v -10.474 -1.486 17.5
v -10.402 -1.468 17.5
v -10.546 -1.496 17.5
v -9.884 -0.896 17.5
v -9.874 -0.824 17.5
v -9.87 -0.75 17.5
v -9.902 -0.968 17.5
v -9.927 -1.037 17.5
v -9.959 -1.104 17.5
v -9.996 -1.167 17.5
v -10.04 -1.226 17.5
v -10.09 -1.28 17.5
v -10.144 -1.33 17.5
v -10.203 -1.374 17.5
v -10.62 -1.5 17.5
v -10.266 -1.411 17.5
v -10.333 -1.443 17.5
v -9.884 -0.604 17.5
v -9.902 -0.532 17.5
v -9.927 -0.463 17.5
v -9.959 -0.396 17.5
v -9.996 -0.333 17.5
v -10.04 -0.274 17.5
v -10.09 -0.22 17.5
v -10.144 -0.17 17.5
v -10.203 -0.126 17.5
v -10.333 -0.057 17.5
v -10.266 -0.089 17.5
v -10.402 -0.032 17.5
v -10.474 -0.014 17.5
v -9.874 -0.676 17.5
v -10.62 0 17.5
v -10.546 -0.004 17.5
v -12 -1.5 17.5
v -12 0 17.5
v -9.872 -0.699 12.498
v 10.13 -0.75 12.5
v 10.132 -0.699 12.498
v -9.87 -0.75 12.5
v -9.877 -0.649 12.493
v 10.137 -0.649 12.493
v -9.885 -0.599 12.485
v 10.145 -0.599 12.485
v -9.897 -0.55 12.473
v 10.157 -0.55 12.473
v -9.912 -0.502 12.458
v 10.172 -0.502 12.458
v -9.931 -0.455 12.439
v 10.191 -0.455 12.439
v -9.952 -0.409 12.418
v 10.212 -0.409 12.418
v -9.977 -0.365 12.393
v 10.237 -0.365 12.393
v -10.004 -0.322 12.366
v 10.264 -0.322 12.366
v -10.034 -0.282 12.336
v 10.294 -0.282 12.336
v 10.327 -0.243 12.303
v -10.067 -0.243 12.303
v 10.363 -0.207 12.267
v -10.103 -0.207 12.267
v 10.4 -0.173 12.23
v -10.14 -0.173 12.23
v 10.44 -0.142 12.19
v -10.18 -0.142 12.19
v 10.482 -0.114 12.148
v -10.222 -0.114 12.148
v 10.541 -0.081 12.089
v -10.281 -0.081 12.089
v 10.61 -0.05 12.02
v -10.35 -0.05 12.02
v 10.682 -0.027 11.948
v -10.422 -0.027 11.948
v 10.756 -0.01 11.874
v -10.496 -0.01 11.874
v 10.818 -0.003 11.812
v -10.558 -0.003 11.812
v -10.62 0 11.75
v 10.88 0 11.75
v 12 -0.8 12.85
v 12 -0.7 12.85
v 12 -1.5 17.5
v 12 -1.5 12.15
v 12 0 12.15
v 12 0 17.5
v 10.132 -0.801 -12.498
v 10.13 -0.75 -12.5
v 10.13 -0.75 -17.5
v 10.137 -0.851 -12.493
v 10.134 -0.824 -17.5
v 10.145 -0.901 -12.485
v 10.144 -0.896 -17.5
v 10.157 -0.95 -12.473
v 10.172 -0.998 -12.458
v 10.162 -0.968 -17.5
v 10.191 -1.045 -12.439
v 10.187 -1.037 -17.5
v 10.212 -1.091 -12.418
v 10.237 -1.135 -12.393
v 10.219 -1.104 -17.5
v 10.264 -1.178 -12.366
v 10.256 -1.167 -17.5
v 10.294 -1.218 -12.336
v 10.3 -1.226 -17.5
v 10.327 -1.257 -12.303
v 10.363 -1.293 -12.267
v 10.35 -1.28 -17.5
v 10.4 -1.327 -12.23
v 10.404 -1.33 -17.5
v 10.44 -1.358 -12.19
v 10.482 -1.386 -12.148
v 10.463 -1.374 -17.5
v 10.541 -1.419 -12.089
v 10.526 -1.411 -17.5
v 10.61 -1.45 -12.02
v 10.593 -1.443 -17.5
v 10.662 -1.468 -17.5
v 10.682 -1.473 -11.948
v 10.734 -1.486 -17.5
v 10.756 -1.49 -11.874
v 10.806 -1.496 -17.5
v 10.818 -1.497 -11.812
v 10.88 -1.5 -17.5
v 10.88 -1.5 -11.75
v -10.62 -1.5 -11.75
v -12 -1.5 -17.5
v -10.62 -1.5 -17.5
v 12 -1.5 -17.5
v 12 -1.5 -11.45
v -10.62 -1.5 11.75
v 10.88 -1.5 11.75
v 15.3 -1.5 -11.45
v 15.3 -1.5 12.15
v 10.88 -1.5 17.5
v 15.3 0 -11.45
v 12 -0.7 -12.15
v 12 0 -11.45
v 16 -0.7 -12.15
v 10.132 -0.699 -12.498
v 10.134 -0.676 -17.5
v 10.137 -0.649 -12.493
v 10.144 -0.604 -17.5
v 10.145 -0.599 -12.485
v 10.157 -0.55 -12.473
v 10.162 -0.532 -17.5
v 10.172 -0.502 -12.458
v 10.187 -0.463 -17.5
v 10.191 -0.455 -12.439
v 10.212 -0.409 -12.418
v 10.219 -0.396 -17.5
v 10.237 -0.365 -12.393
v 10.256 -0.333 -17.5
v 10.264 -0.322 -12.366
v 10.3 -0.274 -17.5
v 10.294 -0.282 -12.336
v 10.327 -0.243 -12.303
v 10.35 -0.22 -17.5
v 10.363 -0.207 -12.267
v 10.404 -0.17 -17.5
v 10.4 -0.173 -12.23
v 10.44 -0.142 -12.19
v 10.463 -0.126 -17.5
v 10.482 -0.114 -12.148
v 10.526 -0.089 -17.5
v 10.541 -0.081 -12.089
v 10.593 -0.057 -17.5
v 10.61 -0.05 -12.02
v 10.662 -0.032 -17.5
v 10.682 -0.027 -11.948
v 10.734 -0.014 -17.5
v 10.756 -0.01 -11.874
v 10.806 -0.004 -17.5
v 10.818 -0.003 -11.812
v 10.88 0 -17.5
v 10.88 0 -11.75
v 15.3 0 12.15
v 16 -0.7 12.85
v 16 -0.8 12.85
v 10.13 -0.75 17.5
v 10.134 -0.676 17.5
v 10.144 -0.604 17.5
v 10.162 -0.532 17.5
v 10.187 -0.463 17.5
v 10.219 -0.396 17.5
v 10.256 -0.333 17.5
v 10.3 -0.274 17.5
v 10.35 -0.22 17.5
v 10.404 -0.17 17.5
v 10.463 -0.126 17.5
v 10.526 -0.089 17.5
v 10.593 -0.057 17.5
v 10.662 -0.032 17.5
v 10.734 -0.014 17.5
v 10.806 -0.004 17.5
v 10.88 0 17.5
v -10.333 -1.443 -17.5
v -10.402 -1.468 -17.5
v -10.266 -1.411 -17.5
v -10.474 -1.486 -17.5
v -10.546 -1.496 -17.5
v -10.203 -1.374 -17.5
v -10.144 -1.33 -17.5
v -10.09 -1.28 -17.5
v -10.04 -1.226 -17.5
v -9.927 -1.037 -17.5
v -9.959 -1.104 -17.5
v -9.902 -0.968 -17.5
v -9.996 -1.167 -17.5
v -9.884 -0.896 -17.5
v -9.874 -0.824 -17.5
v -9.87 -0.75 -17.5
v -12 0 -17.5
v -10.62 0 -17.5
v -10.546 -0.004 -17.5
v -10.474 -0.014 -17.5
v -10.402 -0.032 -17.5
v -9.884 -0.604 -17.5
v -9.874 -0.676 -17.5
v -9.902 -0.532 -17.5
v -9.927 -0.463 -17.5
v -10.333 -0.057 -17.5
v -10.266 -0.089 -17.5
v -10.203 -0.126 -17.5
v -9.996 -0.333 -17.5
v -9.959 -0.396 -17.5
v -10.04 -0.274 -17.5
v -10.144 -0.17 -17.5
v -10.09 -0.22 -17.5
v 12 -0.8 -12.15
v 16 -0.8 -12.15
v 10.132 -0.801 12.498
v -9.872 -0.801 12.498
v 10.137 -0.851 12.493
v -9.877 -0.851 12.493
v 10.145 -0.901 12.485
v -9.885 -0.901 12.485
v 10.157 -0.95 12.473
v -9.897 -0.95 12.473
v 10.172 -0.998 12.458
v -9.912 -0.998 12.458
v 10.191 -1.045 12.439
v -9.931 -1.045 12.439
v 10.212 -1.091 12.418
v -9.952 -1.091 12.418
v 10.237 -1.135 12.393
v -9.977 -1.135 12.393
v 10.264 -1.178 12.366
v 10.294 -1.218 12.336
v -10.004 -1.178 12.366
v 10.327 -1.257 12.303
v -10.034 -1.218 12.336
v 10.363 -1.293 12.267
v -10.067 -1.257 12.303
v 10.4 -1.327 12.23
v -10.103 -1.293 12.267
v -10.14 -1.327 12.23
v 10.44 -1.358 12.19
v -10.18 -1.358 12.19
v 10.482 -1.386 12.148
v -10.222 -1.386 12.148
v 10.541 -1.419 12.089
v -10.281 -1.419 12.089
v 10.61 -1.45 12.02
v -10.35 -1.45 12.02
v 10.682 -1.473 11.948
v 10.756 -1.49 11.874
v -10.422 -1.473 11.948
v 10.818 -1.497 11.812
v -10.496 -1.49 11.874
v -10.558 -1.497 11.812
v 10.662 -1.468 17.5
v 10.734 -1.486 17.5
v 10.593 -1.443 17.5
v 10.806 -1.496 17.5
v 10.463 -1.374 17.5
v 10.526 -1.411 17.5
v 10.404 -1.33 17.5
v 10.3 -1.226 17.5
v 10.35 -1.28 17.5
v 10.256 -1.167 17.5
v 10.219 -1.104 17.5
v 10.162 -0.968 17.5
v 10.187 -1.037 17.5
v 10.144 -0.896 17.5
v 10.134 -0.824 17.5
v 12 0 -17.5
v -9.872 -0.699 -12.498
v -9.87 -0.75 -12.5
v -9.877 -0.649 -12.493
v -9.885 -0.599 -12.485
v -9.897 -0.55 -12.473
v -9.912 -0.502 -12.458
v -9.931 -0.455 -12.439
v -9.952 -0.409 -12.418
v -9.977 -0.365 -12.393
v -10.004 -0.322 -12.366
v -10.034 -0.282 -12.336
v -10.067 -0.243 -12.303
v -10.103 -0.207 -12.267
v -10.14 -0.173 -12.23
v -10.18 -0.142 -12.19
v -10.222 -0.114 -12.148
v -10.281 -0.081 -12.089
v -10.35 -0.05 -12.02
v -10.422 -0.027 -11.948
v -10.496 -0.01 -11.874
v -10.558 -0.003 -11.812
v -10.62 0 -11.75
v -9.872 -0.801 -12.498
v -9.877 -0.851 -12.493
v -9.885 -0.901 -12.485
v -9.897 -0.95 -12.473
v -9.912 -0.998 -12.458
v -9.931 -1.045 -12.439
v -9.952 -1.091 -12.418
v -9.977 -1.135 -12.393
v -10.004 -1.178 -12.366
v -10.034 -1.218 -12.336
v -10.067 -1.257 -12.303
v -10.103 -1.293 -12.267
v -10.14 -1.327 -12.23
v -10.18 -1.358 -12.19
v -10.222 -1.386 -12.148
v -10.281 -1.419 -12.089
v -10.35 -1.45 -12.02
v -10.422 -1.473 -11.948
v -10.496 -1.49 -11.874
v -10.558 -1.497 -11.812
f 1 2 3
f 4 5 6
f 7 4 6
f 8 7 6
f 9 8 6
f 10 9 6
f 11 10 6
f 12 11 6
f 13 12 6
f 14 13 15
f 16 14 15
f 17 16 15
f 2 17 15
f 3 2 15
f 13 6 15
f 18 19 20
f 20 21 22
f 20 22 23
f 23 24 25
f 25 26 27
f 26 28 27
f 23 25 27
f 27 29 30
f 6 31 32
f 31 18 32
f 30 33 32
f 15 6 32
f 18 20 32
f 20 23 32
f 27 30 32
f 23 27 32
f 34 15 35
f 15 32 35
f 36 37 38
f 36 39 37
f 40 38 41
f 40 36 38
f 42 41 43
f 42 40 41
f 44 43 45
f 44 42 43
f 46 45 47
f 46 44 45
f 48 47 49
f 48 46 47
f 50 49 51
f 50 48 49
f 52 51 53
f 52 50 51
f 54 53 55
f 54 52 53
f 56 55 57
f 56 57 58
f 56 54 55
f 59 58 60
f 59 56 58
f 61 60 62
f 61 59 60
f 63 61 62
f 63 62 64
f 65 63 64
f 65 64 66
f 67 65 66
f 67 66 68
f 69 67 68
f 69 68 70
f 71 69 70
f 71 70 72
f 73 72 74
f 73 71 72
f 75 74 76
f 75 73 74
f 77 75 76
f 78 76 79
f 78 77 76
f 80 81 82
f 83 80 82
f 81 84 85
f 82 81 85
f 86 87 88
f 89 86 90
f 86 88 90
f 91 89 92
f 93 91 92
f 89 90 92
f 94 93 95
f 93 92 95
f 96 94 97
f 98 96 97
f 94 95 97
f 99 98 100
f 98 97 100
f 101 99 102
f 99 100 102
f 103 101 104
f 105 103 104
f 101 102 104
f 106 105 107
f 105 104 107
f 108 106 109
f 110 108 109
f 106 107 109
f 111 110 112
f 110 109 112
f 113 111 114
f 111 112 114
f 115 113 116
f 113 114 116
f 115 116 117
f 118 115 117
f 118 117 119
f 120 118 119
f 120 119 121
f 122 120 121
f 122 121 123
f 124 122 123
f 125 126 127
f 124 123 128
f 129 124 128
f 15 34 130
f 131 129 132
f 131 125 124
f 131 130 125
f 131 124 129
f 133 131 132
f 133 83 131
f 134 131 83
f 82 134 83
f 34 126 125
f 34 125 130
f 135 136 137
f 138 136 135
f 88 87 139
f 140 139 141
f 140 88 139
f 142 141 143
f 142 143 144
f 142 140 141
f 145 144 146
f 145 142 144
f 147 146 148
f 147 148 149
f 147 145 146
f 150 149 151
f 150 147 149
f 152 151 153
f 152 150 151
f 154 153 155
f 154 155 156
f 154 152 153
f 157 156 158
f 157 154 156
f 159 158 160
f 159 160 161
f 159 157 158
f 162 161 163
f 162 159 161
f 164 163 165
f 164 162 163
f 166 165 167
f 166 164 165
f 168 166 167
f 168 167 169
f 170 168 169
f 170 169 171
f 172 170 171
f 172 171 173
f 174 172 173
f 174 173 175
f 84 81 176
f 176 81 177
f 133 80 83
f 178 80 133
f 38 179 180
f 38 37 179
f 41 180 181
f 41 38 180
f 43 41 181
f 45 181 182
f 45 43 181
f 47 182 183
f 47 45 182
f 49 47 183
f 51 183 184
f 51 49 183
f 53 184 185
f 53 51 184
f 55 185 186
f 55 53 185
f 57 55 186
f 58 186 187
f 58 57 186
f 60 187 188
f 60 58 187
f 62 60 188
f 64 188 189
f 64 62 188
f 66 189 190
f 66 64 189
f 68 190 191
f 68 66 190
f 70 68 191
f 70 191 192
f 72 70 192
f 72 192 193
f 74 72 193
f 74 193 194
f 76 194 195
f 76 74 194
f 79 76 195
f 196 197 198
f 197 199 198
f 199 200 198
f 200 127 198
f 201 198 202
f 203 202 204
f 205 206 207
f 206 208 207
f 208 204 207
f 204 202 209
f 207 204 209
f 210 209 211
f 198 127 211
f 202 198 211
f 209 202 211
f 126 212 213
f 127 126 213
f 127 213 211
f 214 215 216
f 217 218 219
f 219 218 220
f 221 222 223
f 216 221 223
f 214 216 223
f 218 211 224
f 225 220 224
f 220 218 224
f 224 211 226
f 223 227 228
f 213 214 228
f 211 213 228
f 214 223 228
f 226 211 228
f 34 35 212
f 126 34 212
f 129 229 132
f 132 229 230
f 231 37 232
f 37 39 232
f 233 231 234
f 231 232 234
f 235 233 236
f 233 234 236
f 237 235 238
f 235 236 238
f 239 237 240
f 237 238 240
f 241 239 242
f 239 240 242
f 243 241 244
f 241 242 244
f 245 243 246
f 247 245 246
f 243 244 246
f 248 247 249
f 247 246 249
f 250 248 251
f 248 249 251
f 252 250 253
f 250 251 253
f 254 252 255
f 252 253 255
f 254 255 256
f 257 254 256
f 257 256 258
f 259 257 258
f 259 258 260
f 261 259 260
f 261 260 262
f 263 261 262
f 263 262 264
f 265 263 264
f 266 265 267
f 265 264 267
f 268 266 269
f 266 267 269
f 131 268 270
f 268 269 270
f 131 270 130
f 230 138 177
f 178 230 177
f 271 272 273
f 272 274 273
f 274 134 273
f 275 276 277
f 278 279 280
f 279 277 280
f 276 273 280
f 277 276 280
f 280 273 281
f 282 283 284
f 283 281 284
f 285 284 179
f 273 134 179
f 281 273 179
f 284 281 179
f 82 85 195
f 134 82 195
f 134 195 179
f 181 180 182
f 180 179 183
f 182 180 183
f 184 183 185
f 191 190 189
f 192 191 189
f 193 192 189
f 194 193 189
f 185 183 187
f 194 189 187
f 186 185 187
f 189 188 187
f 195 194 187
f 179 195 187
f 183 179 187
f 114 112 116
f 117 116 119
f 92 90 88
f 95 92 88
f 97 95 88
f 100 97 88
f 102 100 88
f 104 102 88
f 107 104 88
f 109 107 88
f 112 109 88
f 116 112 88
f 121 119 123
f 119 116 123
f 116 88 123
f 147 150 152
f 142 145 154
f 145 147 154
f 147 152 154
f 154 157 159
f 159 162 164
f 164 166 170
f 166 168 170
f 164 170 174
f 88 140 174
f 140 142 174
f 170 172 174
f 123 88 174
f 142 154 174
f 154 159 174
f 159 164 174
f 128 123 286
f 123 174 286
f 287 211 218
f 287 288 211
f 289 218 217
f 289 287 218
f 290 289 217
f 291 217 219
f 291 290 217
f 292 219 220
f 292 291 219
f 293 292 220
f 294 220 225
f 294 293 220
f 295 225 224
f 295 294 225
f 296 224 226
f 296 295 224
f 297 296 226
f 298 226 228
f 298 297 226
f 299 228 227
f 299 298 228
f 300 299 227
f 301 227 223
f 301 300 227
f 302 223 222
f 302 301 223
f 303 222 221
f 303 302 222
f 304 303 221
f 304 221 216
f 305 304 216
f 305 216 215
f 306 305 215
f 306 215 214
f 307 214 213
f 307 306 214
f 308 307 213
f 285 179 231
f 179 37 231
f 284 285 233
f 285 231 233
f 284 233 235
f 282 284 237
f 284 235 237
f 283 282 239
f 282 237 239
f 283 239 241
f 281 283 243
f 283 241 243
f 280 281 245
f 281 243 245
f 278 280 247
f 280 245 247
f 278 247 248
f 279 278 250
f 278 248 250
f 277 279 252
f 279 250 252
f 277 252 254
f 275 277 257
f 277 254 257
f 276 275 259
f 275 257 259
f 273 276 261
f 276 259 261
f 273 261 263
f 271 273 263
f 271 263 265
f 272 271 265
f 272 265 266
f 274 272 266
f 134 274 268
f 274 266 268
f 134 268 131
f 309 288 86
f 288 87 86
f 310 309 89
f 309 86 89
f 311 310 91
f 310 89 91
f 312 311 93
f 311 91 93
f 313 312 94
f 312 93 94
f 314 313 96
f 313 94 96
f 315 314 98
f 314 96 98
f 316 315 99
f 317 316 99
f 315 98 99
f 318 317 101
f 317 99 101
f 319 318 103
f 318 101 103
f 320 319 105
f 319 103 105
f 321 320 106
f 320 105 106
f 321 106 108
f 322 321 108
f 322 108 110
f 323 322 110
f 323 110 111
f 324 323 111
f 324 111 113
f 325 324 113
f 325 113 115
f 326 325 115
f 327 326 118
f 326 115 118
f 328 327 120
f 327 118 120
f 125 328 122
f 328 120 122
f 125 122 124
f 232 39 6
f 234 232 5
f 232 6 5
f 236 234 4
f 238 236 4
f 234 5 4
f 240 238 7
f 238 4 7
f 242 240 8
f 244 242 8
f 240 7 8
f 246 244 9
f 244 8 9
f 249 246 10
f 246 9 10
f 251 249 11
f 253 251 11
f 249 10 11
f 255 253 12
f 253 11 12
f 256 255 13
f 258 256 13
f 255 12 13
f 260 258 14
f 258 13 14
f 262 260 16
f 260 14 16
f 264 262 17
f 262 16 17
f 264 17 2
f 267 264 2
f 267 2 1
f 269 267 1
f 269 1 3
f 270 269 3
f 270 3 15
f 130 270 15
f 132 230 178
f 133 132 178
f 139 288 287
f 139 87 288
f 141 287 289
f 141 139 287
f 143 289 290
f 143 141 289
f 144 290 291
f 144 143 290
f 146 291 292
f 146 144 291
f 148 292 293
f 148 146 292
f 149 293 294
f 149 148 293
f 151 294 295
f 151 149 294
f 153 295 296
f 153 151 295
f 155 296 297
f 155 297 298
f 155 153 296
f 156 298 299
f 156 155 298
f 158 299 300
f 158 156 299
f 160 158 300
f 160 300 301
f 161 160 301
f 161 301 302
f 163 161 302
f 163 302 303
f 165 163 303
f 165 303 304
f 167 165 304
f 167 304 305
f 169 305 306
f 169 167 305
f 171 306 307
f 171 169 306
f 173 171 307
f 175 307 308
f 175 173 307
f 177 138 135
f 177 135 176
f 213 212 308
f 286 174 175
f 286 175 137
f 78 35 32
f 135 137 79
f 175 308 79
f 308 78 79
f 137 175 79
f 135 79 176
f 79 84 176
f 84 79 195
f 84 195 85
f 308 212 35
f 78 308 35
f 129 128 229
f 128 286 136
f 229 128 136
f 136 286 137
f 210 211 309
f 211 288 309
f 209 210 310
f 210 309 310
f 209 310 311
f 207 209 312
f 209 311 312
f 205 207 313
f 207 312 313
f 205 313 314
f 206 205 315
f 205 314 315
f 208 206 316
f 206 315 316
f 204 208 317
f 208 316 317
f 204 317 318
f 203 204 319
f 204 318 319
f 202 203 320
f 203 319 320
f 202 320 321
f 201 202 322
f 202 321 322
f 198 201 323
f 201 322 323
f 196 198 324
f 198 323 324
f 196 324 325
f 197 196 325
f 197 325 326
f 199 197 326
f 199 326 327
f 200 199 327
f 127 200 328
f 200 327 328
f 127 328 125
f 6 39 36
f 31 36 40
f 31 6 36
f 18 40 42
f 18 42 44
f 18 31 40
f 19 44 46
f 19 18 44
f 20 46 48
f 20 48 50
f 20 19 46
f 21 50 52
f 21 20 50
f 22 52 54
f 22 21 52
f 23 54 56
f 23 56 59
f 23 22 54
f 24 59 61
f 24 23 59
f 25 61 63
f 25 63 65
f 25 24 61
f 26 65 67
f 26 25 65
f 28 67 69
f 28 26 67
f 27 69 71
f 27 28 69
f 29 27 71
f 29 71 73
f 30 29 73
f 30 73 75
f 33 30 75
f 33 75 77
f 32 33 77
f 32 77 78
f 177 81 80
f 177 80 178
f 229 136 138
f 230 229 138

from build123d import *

# Parameters (mm, degrees)
F0_W     = 4
F0_H     = 25
F1_DEPTH = 1.5
F2_R     = 0.74999
F3_SIZE  = 0.7


# Not quite as in the source:
# - a fillet or chamfer is up to 0.001 mm smaller than in the source, because OpenCascade refuses the exact size


with BuildPart() as f1:
    # F0 (on Front) → F1 (new body)
    with BuildSketch(Plane.XZ):
        Polygon((-9.8700001836, 17.5), (-12, 17.5), (-12, -17.5), (-9.8700001836, -17.5), (-9.8700001836, -12.5), (10.1299998164, -12.5), (10.1299998164, -17.5), (12, -17.5), (12, -12.1500007808), (12, 12.8499992192), (12, 17.5), (10.1299998164, 17.5), (10.1299998164, 12.5), (-9.8700001836, 12.5), align=None)
        with Locations((14, 0.3499992192)):
            Rectangle(F0_W, F0_H)
    extrude(amount=F1_DEPTH)

    # F2 (radius 0.75 in the source; OpenCascade refuses exactly that, so slightly less here)
    f2_edges = [f1.edges().sort_by_distance(p)[0] for p in [
        (0.13, -1.5, 12.5),
        (0.13, -1.5, -12.5),
        (0.13, 0, -12.5),
        (0.13, 0, 12.5),
        (10.13, 0, 15),
        (-9.87, 0, 15),
        (-9.87, -1.5, 15),
        (-9.87, -1.5, -15),
        (-9.87, 0, -15),
        (10.13, -1.5, -15),
        (10.13, 0, -15),
        (10.13, -1.5, 15),
    ]]
    fillet(f2_edges, radius=F2_R)

    # F3
    f3_edges = [f1.edges().sort_by_distance(p)[0] for p in [
        (16, -1.5, 0.349999),
        (16, 0, 0.349999),
        (14, -1.5, -12.150001),
        (14, 0, -12.150001),
        (14, 0, 12.849999),
        (14, -1.5, 12.849999),
    ]]
    chamfer(f3_edges, length=F3_SIZE)


solid = f1.part
